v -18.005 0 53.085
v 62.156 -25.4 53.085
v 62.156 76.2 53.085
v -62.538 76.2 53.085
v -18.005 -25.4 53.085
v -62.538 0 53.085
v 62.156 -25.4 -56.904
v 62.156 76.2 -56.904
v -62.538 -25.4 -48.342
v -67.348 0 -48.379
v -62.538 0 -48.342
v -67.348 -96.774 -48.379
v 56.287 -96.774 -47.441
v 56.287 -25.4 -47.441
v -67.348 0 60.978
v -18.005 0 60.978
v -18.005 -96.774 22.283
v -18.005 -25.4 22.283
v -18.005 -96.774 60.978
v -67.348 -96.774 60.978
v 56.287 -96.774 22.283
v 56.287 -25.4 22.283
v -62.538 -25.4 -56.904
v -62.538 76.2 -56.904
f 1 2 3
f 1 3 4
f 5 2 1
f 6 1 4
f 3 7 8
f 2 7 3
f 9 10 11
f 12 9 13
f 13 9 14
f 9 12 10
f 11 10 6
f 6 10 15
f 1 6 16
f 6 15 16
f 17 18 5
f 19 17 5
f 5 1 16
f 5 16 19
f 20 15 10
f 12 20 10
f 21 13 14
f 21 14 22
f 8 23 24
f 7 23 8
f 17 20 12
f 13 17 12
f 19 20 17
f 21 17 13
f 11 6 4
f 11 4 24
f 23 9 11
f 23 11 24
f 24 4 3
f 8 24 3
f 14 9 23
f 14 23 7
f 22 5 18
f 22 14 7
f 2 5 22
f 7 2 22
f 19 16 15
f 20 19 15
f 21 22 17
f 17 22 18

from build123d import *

# Parameters (mm, degrees)
F0_W     = 62.537648
F0_H     = 53.085398
F0_W_2   = 62.155746
F1_DEPTH = 25.4
F2_DEPTH = 76.2
F4_DEPTH = 96.774


with BuildPart() as f1:
    # F0 (on Front) → F1 (new body)
    with BuildSketch(Plane.XZ):
        Polygon((62.155746, 0), (0, 0), (-62.537648, 0), (-62.537648, -56.904487), (62.155746, -56.904487), align=None)
        with Locations((-31.268824, 26.542699)):
            Rectangle(F0_W, F0_H)
        with Locations((31.077873, 26.542699)):
            Rectangle(F0_W_2, F0_H)
    extrude(amount=F1_DEPTH)

    # F0 (on Front) → F2 (join)
    with BuildSketch(Plane.XZ):
        Polygon((62.155746, 0), (0, 0), (-62.537648, 0), (-62.537648, -56.904487), (62.155746, -56.904487), align=None)
        with Locations((-31.268824, 26.542699)):
            Rectangle(F0_W, F0_H)
        with Locations((31.077873, 26.542699)):
            Rectangle(F0_W_2, F0_H)
    extrude(amount=-F2_DEPTH)

    # F3 (on Front) → F4 (join)
    with BuildSketch(Plane.XZ):
        Polygon((-67.348078, 60.978152), (-67.348078, -48.378654), (56.28676, -47.44057), (56.28676, 22.282878), (-18.005297, 22.282878), (-18.005297, 60.978152), align=None)
    extrude(amount=F4_DEPTH)


solid = f1.part
